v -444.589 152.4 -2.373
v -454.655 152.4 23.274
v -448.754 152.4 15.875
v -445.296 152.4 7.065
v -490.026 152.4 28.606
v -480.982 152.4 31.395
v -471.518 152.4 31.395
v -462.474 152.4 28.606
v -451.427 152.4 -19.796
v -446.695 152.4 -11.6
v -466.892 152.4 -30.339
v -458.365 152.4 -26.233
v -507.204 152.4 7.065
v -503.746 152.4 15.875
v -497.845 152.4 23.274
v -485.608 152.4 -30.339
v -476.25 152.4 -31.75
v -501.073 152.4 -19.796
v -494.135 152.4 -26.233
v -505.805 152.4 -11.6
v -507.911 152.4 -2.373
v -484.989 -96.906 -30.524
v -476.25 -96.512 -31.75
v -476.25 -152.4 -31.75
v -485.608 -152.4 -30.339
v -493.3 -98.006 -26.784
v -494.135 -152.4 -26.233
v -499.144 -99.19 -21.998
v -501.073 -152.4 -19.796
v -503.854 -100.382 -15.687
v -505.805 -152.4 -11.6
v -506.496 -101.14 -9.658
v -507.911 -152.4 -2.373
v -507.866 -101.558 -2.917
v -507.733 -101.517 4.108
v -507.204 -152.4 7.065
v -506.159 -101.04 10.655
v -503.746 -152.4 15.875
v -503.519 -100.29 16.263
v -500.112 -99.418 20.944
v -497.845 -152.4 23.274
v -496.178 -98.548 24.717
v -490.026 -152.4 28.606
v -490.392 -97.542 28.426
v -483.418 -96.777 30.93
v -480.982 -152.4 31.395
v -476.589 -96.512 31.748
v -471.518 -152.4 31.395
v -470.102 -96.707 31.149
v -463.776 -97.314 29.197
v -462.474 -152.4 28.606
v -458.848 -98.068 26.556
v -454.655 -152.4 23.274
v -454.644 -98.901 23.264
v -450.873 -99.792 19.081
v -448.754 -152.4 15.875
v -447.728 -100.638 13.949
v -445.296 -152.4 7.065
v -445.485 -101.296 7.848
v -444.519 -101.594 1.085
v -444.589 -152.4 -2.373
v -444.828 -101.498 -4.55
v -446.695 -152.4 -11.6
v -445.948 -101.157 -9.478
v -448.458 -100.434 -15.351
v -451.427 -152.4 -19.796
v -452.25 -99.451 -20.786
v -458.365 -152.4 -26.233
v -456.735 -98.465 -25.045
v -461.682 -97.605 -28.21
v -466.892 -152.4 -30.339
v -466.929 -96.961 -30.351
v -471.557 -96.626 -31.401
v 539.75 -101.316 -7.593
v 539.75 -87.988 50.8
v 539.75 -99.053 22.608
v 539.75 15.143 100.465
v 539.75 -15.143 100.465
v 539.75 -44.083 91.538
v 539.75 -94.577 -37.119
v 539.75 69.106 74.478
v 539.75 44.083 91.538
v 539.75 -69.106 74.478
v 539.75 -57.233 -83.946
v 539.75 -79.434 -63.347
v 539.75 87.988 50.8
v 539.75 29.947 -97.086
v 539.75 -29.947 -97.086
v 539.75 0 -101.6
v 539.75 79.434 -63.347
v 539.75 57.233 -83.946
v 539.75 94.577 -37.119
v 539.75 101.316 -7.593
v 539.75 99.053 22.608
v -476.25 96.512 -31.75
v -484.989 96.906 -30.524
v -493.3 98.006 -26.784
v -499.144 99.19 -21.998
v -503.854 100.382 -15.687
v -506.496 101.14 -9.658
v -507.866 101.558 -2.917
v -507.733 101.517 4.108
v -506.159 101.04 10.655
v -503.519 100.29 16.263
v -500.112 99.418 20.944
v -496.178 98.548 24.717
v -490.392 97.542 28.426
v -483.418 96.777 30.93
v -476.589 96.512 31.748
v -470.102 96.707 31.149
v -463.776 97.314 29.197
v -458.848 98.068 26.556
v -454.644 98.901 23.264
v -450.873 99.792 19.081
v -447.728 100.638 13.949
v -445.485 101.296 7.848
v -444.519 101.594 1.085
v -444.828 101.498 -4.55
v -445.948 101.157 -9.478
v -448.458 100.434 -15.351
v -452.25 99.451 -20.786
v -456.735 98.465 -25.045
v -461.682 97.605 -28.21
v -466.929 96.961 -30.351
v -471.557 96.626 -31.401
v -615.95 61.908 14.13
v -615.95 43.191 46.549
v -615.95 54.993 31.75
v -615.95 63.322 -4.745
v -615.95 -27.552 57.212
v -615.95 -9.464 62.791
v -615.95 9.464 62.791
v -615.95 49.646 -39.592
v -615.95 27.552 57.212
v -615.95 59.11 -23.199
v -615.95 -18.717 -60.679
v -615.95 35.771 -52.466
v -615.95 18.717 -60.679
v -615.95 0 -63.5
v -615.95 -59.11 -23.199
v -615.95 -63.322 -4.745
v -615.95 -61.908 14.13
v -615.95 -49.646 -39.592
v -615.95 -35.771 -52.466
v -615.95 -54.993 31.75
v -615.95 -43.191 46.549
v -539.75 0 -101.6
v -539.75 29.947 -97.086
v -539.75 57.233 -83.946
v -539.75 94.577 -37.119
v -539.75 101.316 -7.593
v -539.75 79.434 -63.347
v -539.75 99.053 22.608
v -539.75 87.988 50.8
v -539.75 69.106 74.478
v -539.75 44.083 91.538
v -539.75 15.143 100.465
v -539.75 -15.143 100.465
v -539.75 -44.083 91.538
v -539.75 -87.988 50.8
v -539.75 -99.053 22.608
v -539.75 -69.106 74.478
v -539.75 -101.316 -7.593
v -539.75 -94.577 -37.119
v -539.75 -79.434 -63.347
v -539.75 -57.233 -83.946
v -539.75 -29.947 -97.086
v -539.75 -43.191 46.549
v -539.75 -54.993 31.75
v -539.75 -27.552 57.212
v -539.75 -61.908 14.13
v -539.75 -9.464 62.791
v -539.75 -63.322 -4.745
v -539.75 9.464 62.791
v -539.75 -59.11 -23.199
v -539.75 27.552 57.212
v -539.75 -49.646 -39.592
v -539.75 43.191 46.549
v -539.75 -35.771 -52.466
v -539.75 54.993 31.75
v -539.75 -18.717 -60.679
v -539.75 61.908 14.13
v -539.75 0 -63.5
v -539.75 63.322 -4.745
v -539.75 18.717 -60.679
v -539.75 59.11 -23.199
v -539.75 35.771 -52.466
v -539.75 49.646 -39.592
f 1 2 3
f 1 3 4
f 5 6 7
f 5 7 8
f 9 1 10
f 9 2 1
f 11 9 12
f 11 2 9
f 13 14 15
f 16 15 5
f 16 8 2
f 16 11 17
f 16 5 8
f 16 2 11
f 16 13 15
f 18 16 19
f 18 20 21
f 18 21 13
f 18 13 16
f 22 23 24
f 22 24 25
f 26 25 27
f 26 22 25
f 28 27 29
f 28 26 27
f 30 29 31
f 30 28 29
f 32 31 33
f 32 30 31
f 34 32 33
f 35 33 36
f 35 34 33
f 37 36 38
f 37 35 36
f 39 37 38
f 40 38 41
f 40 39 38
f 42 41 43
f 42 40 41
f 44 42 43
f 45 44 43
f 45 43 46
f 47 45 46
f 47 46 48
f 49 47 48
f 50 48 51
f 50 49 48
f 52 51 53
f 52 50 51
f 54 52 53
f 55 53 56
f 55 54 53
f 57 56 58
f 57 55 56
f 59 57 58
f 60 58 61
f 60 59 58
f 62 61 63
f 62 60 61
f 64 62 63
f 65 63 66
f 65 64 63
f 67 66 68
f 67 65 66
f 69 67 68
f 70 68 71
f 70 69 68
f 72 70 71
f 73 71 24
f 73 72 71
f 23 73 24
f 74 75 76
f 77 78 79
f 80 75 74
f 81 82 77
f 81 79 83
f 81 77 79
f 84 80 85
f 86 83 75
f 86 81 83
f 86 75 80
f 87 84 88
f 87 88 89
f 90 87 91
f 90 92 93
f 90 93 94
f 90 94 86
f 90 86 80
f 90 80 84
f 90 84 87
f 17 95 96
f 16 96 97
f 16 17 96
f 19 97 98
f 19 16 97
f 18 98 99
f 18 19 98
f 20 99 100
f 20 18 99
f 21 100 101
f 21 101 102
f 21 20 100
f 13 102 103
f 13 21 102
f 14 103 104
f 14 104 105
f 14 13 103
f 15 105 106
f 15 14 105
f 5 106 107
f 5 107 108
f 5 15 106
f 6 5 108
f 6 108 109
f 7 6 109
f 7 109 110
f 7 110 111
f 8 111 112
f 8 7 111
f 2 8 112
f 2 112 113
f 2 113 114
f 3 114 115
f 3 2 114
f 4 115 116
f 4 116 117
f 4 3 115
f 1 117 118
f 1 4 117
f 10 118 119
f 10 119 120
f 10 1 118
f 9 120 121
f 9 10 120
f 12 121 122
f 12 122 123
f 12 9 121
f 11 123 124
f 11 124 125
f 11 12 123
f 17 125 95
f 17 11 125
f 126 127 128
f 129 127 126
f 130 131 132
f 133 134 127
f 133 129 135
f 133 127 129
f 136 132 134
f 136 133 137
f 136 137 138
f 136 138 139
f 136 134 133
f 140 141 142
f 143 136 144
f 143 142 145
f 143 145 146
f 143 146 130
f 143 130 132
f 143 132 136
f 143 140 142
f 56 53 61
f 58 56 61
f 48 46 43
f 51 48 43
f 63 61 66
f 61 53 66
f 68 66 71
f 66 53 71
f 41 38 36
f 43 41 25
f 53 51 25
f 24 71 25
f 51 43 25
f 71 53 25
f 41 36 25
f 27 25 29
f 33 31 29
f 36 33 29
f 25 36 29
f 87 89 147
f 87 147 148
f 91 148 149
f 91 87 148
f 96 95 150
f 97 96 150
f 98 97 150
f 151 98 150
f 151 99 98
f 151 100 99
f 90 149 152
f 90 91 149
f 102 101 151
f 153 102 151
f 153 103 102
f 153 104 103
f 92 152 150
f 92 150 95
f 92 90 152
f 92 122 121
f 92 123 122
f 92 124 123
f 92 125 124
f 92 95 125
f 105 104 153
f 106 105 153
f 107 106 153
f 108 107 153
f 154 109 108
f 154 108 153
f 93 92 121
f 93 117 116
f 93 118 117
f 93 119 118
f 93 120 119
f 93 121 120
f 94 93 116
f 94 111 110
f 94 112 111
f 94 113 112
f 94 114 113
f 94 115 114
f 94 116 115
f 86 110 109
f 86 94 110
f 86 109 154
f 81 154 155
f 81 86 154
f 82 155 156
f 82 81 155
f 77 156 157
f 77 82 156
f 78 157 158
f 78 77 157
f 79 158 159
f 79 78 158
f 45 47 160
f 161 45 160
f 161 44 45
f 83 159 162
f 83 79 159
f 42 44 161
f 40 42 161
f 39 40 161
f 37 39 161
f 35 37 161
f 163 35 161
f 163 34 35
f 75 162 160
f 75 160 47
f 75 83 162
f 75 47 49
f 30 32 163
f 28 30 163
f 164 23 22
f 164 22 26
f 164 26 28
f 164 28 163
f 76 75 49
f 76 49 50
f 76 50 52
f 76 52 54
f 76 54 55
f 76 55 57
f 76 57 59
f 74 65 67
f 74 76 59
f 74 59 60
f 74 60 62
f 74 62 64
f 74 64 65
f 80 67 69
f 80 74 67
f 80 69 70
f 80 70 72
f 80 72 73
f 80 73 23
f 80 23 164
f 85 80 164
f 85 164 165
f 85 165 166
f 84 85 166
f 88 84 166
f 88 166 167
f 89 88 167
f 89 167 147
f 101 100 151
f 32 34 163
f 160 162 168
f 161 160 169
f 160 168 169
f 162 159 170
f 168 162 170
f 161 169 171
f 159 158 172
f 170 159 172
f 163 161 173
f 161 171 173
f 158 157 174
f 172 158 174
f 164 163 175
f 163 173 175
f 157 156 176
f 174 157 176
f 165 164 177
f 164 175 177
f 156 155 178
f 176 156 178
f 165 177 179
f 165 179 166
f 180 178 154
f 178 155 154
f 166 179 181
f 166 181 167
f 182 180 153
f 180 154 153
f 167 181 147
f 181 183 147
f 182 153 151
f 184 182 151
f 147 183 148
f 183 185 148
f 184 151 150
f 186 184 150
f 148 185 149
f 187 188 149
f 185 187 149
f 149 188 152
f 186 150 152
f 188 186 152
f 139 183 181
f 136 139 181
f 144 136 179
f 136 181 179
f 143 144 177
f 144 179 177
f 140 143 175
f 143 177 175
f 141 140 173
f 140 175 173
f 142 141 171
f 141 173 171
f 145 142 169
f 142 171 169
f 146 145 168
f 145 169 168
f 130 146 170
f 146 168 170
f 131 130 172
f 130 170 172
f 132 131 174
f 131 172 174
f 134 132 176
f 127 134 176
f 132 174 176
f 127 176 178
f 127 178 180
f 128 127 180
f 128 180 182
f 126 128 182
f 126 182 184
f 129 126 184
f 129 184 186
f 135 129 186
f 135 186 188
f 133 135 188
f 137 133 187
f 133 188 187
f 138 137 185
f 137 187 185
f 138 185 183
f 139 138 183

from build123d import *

# Parameters (mm, degrees)
SKETCH1_R           = 101.6
BOSS_EXTRUDE1_DEPTH = 539.75
SKETCH2_R           = 31.75
BOSS_EXTRUDE2_DEPTH = 152.4
SKETCH3_R           = 63.5
BOSS_EXTRUDE3_DEPTH = 76.2


with BuildPart() as part:
    # Sketch1 → Boss-Extrude1 (new, symmetric)
    with BuildSketch(Plane(origin=(0, 0, 0), x_dir=(0, 0, -1), z_dir=(1, 0, 0))):
        Circle(SKETCH1_R)
    extrude(amount=BOSS_EXTRUDE1_DEPTH, both=True)

    # Sketch2 → Boss-Extrude2 (add, symmetric)
    with BuildSketch(Plane(origin=(0, 0, 0), x_dir=(1, 0, 0), z_dir=(0, 1, 0))):
        with Locations(Location((-476.25, 0, 0), (0, 0, 90))):
            Circle(SKETCH2_R)
    extrude(amount=BOSS_EXTRUDE2_DEPTH, both=True)

    # Sketch3 → Boss-Extrude3 (add)
    with BuildSketch(Plane.ZY.offset(539.75)):
        with Locations(Location((0, 0, 0), (0, 0, 180))):
            Circle(SKETCH3_R)
    extrude(amount=BOSS_EXTRUDE3_DEPTH)


solid = part.part
